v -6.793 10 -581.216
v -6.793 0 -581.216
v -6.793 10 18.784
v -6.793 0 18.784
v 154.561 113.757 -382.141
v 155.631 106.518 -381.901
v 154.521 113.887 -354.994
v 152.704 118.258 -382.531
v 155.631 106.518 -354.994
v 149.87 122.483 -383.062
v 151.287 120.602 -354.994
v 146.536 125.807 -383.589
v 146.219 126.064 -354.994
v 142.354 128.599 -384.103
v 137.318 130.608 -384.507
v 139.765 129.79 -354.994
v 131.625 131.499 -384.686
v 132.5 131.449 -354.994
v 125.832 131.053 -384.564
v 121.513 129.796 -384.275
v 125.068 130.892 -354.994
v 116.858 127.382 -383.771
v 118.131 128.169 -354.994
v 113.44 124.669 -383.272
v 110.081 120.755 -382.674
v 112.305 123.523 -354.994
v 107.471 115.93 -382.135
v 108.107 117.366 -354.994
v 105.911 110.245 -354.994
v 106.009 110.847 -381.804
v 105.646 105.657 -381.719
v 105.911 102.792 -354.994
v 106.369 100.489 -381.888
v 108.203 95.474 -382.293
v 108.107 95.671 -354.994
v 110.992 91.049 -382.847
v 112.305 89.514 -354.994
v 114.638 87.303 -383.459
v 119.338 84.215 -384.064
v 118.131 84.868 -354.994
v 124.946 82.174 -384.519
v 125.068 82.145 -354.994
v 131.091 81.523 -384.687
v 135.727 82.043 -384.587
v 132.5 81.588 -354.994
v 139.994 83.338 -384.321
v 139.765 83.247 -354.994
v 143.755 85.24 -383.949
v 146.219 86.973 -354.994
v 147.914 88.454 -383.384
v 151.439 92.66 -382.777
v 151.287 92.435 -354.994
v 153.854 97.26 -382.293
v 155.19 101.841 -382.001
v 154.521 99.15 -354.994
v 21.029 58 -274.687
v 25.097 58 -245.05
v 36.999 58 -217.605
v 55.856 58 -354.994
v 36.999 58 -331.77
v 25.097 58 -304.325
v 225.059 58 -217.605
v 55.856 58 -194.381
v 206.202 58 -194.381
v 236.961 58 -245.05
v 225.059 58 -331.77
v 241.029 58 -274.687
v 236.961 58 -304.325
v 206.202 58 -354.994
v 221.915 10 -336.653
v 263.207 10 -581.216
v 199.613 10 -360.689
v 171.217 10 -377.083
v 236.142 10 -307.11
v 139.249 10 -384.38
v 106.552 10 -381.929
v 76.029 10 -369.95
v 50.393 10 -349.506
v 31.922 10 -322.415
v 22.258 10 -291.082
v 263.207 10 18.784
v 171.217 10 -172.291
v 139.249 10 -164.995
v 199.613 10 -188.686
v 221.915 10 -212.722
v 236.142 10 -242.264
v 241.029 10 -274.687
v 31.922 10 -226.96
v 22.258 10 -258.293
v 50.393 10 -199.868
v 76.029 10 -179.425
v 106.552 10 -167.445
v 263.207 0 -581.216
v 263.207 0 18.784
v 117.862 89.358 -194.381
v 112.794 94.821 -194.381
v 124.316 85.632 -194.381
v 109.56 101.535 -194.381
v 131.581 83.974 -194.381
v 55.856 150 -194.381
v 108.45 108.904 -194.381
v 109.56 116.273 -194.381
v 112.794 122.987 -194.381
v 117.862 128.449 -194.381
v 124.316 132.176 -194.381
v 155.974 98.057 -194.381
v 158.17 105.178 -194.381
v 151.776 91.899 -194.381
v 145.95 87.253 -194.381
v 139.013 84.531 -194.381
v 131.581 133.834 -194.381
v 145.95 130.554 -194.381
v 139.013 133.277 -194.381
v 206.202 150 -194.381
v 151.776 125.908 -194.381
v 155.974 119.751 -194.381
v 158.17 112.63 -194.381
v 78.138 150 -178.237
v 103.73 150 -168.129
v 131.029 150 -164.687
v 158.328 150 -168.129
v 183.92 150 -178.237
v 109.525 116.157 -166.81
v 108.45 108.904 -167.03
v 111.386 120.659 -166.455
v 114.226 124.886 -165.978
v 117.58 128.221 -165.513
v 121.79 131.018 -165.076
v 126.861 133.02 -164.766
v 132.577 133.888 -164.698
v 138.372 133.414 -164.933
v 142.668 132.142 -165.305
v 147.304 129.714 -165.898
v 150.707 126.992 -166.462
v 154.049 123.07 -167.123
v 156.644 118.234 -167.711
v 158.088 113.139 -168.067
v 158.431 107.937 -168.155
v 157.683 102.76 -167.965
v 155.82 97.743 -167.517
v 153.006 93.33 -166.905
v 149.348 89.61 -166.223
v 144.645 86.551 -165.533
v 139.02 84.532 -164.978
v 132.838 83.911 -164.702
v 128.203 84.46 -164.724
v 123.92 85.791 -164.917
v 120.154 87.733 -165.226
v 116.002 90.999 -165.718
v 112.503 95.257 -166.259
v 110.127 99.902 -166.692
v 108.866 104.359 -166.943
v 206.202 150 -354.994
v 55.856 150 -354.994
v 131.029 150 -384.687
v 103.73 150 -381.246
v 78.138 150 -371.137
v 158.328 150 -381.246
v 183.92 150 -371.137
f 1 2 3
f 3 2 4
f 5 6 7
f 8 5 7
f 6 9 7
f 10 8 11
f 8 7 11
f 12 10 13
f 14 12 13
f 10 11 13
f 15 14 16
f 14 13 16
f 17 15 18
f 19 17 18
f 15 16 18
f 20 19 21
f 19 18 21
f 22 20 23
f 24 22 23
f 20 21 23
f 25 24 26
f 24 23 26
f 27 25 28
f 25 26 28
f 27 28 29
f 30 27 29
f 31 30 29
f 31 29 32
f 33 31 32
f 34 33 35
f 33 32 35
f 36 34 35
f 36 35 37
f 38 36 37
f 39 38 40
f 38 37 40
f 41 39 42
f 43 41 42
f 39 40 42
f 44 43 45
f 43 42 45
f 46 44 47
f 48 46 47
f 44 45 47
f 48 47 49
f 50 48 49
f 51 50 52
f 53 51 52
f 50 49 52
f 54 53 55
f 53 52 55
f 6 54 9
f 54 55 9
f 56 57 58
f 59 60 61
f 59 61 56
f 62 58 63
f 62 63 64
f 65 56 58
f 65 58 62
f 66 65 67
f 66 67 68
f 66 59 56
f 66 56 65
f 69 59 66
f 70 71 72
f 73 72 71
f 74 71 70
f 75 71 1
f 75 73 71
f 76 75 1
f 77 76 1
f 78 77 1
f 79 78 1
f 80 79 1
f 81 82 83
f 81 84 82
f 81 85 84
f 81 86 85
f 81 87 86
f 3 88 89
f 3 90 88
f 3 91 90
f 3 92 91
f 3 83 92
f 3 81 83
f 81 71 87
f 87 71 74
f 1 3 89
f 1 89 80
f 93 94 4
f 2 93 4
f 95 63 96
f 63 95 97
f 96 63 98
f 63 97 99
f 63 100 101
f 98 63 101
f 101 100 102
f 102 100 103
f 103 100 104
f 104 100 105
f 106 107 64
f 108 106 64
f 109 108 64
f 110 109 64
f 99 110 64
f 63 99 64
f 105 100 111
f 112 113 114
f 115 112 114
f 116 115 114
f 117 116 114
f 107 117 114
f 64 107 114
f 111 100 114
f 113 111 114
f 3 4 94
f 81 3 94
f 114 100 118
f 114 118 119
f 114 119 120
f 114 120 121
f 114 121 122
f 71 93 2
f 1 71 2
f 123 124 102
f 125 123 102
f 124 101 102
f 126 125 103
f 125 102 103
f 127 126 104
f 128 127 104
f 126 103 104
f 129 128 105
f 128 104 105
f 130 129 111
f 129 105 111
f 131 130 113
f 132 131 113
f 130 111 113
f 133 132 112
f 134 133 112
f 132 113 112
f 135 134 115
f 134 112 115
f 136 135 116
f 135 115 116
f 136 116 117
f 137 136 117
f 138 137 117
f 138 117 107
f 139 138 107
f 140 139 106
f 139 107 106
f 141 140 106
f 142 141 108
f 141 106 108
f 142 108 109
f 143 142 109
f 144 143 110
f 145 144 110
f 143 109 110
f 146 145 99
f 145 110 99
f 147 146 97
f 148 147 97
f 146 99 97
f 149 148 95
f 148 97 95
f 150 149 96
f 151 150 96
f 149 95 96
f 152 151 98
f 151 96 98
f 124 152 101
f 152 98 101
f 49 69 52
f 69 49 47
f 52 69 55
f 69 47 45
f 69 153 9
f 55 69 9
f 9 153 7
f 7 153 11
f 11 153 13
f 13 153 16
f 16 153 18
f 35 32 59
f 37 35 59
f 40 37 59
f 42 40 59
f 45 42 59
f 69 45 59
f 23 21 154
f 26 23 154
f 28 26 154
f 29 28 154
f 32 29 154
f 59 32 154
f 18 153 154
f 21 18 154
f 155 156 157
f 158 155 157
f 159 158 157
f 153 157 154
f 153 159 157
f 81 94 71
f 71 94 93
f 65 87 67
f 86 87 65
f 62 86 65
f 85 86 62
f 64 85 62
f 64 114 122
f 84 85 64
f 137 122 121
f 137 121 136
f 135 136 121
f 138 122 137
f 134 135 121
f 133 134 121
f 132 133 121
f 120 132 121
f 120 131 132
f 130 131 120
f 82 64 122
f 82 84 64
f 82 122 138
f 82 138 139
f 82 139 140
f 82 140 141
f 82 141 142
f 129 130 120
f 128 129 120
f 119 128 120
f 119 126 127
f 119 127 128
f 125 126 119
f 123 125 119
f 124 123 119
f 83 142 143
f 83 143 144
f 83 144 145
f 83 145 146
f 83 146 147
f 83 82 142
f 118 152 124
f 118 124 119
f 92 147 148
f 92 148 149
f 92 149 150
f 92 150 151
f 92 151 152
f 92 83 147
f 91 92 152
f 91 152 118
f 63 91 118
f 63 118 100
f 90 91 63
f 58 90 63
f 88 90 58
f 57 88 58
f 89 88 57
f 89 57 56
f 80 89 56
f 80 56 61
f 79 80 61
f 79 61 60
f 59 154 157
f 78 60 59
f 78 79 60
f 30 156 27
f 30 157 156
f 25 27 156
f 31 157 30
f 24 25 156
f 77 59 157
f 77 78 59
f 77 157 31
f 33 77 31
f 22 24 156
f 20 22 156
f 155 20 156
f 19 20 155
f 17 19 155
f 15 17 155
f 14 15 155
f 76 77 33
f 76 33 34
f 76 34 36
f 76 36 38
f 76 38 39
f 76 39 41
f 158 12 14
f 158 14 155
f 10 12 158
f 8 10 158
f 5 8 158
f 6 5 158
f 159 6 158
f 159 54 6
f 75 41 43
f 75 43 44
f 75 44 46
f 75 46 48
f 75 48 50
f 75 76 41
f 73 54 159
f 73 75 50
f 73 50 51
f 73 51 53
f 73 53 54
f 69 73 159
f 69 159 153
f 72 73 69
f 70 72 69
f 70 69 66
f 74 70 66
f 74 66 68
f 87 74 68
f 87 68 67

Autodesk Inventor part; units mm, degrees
ref_plane "YZ Plane" through (0, 0, 0) normal (1, 0, 0) x (0, 1, 0)
ref_plane "XZ Plane" through (0, 0, 0) normal (0, 1, 0) x (-1, 0, 0)
ref_plane "XY Plane" through (0, 0, 0) normal (0, 0, 1) x (1, 0, 0)
sketch "Sketch1" plane through (0, 0, 0) normal (0, 1, 0) x (-1, 0, 0)
  line L0 (6.793, 18.7845) -> (-263.207, 18.7845)
  line L1 (-263.207, 18.7845) -> (-263.207, -581.2155)
  line L2 (-263.207, -581.2155) -> (6.793, -581.2155)
  line L3 (6.793, -581.2155) -> (6.793, 18.7845)
  point P0 (0, 0)
  dimension "d0" = 270
  dimension "d1" = 600
extrude "Extrusion1" add sketch "Sketch1" along normal blind 10
sketch "Sketch2" plane through (0, 10, 0) normal (0, 1, 0) x (1, 0, 0)
  point P0 (0, 0)
sketch "Sketch3" plane through (0, 10, 0) normal (0, 1, 0) x (1, 0, 0)
  circle A0 centre (131.029, 274.6873) radius 110
  point P0 (0, 0)
  dimension "d4" = 220
extrude "Extrusion2" add sketch "Sketch3" along normal blind 140
sketch "Sketch4" plane through (131.029, 150, -274.6873) normal (0, 1, 0) x (1, 0, 0)
  circle A0 centre (0, 0) radius 110 projected
  line L0 (-75.1726, -80.3062) -> (75.1726, -80.3062)
  line L1 (75.1726, -80.3062) -> (75.1726, 80.3062)
  line L2 (75.1726, 80.3062) -> (-75.1726, 80.3062)
  line L3 (-75.1726, 80.3062) -> (-75.1726, -80.3062)
  line L4 (-75.1726, -80.3062) -> (75.1726, 80.3062) construction
  line L5 (75.1726, -80.3062) -> (-75.1726, 80.3062) construction
  arc A1 (-75.1726, 80.3062) -> (-75.1726, -80.3062) centre (0, 0) ccw
  arc A2 (75.1726, -80.3062) -> (75.1726, 80.3062) centre (0, 0) ccw
  point P0 (-131.029, -274.6873)
  point P1 (-75.1726, 80.3062)
  point P2 (75.1726, -80.3062)
extrude "Extrusion3" cut sketch "Sketch4" against normal blind 92 contours A0 L1 | L1 L0 L3 L2 | L3 A0
sketch "Sketch5" plane through (206.2016, 150, -194.3811) normal (0, 0, -1) x (-1, 0, 0)
  circle A0 centre (72.7519, -41.0963) radius 25
  point P0 (206.2016, -150)
  dimension "d9" = 50
extrude "Extrusion4" cut sketch "Sketch5" against normal blind 92
sketch "Sketch6" plane through (55.8564, 150, -354.9935) normal (0, 0, 1) x (1, 0, 0)
  circle A0 centre (74.775, -43.4815) radius 25
  point P0 (-55.8564, -150)
  dimension "d12" = 50
extrude "Extrusion5" cut sketch "Sketch6" against normal blind 92
